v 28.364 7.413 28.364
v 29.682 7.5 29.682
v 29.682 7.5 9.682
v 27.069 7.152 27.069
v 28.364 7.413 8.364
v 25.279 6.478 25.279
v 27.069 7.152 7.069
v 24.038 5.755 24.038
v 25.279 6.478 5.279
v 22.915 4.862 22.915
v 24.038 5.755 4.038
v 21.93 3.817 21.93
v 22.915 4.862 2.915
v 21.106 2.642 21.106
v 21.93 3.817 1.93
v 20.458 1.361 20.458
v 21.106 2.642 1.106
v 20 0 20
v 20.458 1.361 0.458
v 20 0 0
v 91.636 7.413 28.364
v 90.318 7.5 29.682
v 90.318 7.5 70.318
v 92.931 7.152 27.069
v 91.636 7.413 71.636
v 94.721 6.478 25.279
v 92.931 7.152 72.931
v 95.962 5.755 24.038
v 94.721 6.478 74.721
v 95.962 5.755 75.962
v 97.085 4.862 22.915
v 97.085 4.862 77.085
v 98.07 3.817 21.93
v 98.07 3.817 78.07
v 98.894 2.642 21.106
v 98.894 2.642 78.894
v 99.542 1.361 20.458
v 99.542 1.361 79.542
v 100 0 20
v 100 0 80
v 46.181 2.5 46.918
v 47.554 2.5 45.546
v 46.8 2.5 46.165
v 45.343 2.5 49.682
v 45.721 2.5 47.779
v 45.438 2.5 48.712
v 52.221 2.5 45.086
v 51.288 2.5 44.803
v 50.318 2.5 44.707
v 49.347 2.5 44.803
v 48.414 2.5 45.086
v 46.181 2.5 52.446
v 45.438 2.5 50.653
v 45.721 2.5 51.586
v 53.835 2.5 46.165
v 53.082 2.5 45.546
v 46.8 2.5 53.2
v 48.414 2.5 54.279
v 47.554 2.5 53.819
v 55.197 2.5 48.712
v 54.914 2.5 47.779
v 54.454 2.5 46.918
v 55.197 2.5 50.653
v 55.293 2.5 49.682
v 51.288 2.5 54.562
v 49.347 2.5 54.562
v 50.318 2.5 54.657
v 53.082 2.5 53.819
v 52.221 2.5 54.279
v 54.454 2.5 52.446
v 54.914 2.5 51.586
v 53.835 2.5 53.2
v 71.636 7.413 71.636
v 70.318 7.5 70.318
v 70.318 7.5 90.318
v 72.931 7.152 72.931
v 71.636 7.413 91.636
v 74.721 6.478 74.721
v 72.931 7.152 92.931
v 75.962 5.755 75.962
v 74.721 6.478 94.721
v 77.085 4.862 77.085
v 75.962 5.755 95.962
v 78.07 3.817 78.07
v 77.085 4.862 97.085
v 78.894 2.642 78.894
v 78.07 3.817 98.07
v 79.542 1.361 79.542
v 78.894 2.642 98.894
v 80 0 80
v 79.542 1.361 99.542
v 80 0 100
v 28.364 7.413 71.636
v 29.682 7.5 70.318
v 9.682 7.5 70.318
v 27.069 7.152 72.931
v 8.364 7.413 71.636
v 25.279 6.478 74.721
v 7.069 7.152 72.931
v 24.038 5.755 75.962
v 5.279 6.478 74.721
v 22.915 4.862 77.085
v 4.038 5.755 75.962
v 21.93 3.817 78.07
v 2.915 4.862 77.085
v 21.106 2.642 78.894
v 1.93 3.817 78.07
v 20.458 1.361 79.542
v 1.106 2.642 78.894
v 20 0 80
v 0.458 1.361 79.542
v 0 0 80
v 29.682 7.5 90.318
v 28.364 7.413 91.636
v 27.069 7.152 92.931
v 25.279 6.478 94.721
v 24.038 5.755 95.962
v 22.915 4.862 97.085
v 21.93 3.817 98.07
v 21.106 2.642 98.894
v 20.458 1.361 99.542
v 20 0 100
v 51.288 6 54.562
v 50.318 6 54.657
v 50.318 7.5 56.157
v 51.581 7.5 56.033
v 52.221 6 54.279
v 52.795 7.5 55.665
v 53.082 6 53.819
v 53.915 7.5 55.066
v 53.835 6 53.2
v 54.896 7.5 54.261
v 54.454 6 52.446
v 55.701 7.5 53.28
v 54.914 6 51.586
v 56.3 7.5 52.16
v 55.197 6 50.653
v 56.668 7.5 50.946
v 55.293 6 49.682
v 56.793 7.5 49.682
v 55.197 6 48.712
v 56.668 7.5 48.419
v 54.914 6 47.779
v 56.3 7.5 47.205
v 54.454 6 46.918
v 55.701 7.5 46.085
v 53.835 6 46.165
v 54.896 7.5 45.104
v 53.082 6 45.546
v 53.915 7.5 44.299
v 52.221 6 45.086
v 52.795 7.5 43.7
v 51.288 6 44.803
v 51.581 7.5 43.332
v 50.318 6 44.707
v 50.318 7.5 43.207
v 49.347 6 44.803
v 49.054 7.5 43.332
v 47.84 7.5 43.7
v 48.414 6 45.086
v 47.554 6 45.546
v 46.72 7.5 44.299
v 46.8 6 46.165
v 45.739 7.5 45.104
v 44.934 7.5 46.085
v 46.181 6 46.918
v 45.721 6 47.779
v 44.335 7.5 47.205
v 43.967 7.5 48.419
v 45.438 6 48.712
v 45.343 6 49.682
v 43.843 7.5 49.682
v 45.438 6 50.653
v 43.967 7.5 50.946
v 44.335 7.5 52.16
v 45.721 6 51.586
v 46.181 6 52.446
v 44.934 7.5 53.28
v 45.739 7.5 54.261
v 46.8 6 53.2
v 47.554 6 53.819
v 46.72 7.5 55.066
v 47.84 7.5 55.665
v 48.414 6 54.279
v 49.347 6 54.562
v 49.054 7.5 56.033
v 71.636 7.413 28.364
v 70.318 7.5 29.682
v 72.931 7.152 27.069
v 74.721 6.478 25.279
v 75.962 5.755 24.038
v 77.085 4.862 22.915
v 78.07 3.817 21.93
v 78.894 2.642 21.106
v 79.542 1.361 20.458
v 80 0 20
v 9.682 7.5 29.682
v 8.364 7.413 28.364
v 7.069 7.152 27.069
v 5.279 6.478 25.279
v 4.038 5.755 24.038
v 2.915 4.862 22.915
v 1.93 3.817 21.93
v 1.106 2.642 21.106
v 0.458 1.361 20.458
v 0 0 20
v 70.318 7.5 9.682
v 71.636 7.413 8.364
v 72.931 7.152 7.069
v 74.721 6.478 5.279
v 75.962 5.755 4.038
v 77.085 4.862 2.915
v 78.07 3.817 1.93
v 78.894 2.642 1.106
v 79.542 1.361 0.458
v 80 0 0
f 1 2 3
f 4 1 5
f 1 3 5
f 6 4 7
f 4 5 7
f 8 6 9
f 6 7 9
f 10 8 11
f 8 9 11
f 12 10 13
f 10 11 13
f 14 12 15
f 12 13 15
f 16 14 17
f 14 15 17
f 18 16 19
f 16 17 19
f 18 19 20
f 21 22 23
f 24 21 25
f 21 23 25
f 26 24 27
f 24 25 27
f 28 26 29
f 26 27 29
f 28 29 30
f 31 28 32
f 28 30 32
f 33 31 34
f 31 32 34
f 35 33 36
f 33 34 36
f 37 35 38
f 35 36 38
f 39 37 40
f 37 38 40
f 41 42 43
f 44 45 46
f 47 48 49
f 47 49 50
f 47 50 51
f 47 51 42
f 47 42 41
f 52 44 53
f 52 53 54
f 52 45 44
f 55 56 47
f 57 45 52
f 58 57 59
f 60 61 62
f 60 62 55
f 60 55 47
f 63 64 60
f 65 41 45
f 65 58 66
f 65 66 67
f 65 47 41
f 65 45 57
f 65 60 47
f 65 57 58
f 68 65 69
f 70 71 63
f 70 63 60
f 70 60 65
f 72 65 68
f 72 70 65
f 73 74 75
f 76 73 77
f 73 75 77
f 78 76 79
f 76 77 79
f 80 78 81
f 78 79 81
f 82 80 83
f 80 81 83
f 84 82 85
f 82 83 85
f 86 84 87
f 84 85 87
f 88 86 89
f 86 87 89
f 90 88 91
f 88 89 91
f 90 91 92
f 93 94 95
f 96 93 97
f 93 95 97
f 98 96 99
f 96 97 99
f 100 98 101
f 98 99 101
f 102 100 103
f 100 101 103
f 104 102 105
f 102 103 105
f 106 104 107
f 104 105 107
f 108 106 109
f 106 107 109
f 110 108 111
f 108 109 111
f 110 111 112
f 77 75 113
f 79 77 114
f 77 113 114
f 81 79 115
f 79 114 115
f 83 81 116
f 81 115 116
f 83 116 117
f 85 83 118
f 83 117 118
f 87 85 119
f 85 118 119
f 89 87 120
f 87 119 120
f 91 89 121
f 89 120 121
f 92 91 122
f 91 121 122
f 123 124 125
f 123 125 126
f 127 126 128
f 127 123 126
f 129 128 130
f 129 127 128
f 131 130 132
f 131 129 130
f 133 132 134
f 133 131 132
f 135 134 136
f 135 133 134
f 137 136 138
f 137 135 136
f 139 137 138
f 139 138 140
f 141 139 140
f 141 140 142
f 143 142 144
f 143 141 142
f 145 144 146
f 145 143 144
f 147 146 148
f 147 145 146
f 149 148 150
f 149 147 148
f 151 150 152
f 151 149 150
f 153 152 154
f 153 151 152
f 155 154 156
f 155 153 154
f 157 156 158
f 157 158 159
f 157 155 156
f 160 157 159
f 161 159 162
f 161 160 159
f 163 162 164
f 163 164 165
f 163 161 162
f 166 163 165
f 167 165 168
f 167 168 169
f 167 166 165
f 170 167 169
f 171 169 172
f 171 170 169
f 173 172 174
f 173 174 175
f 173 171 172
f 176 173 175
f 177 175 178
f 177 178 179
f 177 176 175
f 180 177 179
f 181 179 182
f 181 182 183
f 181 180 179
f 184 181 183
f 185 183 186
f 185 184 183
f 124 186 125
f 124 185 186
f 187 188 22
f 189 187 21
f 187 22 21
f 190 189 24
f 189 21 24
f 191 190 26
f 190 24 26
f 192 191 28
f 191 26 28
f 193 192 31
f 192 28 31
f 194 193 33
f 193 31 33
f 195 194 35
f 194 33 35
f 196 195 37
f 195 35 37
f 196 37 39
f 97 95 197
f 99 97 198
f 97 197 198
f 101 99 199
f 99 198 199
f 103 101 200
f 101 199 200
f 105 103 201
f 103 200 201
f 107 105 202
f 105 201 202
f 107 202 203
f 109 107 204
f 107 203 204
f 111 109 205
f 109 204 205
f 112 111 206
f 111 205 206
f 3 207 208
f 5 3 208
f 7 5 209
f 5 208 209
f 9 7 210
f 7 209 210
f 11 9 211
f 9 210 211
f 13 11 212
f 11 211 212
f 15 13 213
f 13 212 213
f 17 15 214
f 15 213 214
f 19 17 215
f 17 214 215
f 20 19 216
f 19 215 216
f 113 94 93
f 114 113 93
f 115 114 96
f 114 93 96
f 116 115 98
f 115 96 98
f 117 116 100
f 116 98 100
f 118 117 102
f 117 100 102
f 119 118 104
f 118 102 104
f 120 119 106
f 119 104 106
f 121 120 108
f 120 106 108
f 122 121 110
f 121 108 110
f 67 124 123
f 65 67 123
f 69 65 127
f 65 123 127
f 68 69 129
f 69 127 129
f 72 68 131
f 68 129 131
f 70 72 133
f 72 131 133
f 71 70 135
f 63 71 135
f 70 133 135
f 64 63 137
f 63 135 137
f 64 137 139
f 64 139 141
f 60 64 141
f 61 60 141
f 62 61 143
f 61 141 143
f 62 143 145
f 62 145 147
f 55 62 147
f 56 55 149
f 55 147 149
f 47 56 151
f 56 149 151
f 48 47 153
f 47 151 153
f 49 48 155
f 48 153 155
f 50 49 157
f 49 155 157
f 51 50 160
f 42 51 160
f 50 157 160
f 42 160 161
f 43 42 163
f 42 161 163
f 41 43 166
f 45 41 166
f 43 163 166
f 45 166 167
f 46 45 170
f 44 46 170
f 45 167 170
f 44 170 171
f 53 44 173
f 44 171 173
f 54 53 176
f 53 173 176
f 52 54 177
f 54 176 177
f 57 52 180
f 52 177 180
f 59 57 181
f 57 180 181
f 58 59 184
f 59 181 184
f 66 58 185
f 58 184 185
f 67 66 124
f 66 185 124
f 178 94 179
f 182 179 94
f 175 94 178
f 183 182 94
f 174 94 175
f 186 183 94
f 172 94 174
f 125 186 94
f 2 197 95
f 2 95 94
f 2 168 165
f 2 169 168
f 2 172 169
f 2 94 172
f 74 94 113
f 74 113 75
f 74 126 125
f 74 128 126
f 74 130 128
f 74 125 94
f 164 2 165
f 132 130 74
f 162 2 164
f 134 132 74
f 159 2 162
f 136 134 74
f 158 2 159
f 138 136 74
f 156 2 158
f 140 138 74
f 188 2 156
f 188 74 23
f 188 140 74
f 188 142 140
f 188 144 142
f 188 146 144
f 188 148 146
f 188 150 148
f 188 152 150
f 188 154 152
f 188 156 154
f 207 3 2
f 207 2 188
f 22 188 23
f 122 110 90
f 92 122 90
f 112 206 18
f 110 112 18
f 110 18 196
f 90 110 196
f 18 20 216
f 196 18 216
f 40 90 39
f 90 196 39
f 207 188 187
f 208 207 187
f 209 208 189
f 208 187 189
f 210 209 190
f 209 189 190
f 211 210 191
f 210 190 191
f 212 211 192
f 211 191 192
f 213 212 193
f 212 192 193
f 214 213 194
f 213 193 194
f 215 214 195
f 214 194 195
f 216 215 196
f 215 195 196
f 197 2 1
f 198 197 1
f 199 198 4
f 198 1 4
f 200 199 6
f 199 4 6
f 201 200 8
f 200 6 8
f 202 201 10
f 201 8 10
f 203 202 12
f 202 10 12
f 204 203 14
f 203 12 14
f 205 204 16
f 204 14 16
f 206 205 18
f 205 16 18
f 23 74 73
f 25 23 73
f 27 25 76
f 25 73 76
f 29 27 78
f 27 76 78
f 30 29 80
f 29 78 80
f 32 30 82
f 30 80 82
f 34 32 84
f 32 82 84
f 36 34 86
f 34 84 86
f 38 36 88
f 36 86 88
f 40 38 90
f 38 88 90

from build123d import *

# Parameters (mm, degrees)
BOSS_EXTRUDE1_DEPTH = 7.5
FILLET1_R           = 10
SKETCH2_R           = 4.975
CUT_EXTRUDE1_DEPTH  = 5
CHAMFER2_SIZE       = 1.5


with BuildPart() as part:
    # Sketch1 → Boss-Extrude1 (new body)
    with BuildSketch(Plane(origin=(0, 0, 0), x_dir=(1, 0, 0), z_dir=(0, 1, 0))):
        Polygon((80, 0), (20, 0), (20, -20), (0, -20), (0, -80), (20, -80), (20, -100), (80, -100), (80, -80), (100, -80), (100, -20), (80, -20), align=None)
    extrude(amount=BOSS_EXTRUDE1_DEPTH)

    # Fillet1
    # the kernel refuses this fillet: 10 mm, written as the material it takes off along each edge
    with BuildSketch(Plane(origin=(-24.206145914, 7.5, 80), x_dir=(0, -1, 0), z_dir=(1, 0, 0)), Plane(origin=(20, 7.5, 80), x_dir=(0, -1, 0), z_dir=(0, 0, 1)), Plane(origin=(80, 7.5, 124.206145914), x_dir=(0, -1, 0), z_dir=(0, 0, -1)), Plane(origin=(80, 7.5, 80), x_dir=(0, -1, 0), z_dir=(1, 0, 0)), Plane(origin=(124.206145914, 7.5, 20), x_dir=(0, -1, 0), z_dir=(-1, 0, 0)), Plane(origin=(80, 7.5, 20), x_dir=(0, -1, 0), z_dir=(0, 0, -1)), Plane(origin=(20, 7.5, -24.206145914), x_dir=(0, -1, 0), z_dir=(0, 0, 1)), Plane(origin=(20, 7.5, 20), x_dir=(0, -1, 0), z_dir=(-1, 0, 0))) as fillet1_piece_1:
        with BuildLine():
            CenterArc((10, 9.682458366), FILLET1_R, 180, 75.522487814)
            Line((0, 9.682458366), (-0.2, 9.682458366))
            Line((-0.2, 9.682458366), (-0.2, 0))
            Line((-0.2, 0), (0, -0.2))
            ThreePointArc((0, -0.2), (3.75, -0.2), (7.45, -0.193649167))
            Line((7.45, -0.193649167), (7.5, 0))
        make_face()
    extrude(amount=44.206145914, mode=Mode.SUBTRACT)
    with BuildSketch(Plane(origin=(-4.206145914, 7.5, 100), x_dir=(0, -1, 0), z_dir=(1, 0, 0)), Plane(origin=(100, 7.5, 104.206145914), x_dir=(0, -1, 0), z_dir=(0, 0, -1)), Plane(origin=(104.206145914, 7.5, 0), x_dir=(0, -1, 0), z_dir=(-1, 0, 0)), Plane(origin=(0, 7.5, -4.206145914), x_dir=(0, -1, 0), z_dir=(0, 0, 1))) as fillet1_piece_2:
        with BuildLine():
            CenterArc((10, 9.682458366), FILLET1_R, 180, 75.522487814)
            Line((0, 9.682458366), (-0.2, 9.682458366))
            Line((-0.2, 9.682458366), (-0.2, 0))
            Line((-0.2, 0), (0, -0.2))
            ThreePointArc((0, -0.2), (3.75, -0.2), (7.45, -0.193649167))
            Line((7.45, -0.193649167), (7.5, 0))
        make_face()
    extrude(amount=108.412291828, mode=Mode.SUBTRACT)
    with BuildSketch(Plane(origin=(-24.206145914, 7.5, 80), x_dir=(0, -1, 0), z_dir=(1, 0, 0))) as fillet1_piece_3a_section:
        with BuildLine():
            CenterArc((10, 9.682458366), FILLET1_R, 180, 75.522487814)
            Line((0, 9.682458366), (-0.2, 9.682458366))
            Line((-0.2, 9.682458366), (-0.2, 0))
            Line((-0.2, 0), (0, -0.2))
            ThreePointArc((0, -0.2), (3.75, -0.2), (7.45, -0.193649167))
            Line((7.45, -0.193649167), (7.5, 0))
        make_face()
    fillet1_piece_3a = extrude(amount=68.412291828, mode=Mode.PRIVATE)
    fillet1_piece_3a = split(fillet1_piece_3a, bisect_by=Plane(origin=(20, 5.604082443, 77.718558992), z_dir=(1, 0, 0)), keep=Keep.TOP, mode=Mode.PRIVATE)
    with BuildSketch(Plane(origin=(20, 7.5, 55.793854086), x_dir=(0, -1, 0), z_dir=(0, 0, 1))) as fillet1_piece_3b_section:
        with BuildLine():
            CenterArc((10, 9.682458366), FILLET1_R, 180, 75.522487814)
            Line((0, 9.682458366), (-0.2, 9.682458366))
            Line((-0.2, 9.682458366), (-0.2, 0))
            Line((-0.2, 0), (0, -0.2))
            ThreePointArc((0, -0.2), (3.75, -0.2), (7.45, -0.193649167))
            Line((7.45, -0.193649167), (7.5, 0))
        make_face()
    fillet1_piece_3b = extrude(amount=68.412291828, mode=Mode.PRIVATE)
    fillet1_piece_3b = split(fillet1_piece_3b, bisect_by=Plane(origin=(22.281441008, 5.604082443, 80), z_dir=(0, 0, -1)), keep=Keep.TOP, mode=Mode.PRIVATE)
    fillet1_piece_3 = fillet1_piece_3a & fillet1_piece_3b
    add(fillet1_piece_3, mode=Mode.SUBTRACT)
    with BuildSketch(Plane(origin=(80, 7.5, 124.206145914), x_dir=(0, -1, 0), z_dir=(0, 0, -1))) as fillet1_piece_4a_section:
        with BuildLine():
            CenterArc((10, 9.682458366), FILLET1_R, 180, 75.522487814)
            Line((0, 9.682458366), (-0.2, 9.682458366))
            Line((-0.2, 9.682458366), (-0.2, 0))
            Line((-0.2, 0), (0, -0.2))
            ThreePointArc((0, -0.2), (3.75, -0.2), (7.45, -0.193649167))
            Line((7.45, -0.193649167), (7.5, 0))
        make_face()
    fillet1_piece_4a = extrude(amount=68.412291828, mode=Mode.PRIVATE)
    fillet1_piece_4a = split(fillet1_piece_4a, bisect_by=Plane(origin=(77.718558992, 5.604082443, 80), z_dir=(0, 0, -1)), keep=Keep.TOP, mode=Mode.PRIVATE)
    with BuildSketch(Plane(origin=(55.793854086, 7.5, 80), x_dir=(0, -1, 0), z_dir=(1, 0, 0))) as fillet1_piece_4b_section:
        with BuildLine():
            CenterArc((10, 9.682458366), FILLET1_R, 180, 75.522487814)
            Line((0, 9.682458366), (-0.2, 9.682458366))
            Line((-0.2, 9.682458366), (-0.2, 0))
            Line((-0.2, 0), (0, -0.2))
            ThreePointArc((0, -0.2), (3.75, -0.2), (7.45, -0.193649167))
            Line((7.45, -0.193649167), (7.5, 0))
        make_face()
    fillet1_piece_4b = extrude(amount=68.412291828, mode=Mode.PRIVATE)
    fillet1_piece_4b = split(fillet1_piece_4b, bisect_by=Plane(origin=(80, 5.604082443, 77.718558992), z_dir=(-1, 0, 0)), keep=Keep.TOP, mode=Mode.PRIVATE)
    fillet1_piece_4 = fillet1_piece_4a & fillet1_piece_4b
    add(fillet1_piece_4, mode=Mode.SUBTRACT)
    with BuildSketch(Plane(origin=(124.206145914, 7.5, 20), x_dir=(0, -1, 0), z_dir=(-1, 0, 0))) as fillet1_piece_5a_section:
        with BuildLine():
            CenterArc((10, 9.682458366), FILLET1_R, 180, 75.522487814)
            Line((0, 9.682458366), (-0.2, 9.682458366))
            Line((-0.2, 9.682458366), (-0.2, 0))
            Line((-0.2, 0), (0, -0.2))
            ThreePointArc((0, -0.2), (3.75, -0.2), (7.45, -0.193649167))
            Line((7.45, -0.193649167), (7.5, 0))
        make_face()
    fillet1_piece_5a = extrude(amount=68.412291828, mode=Mode.PRIVATE)
    fillet1_piece_5a = split(fillet1_piece_5a, bisect_by=Plane(origin=(80, 5.604082443, 22.281441008), z_dir=(-1, 0, 0)), keep=Keep.TOP, mode=Mode.PRIVATE)
    with BuildSketch(Plane(origin=(80, 7.5, 44.206145914), x_dir=(0, -1, 0), z_dir=(0, 0, -1))) as fillet1_piece_5b_section:
        with BuildLine():
            CenterArc((10, 9.682458366), FILLET1_R, 180, 75.522487814)
            Line((0, 9.682458366), (-0.2, 9.682458366))
            Line((-0.2, 9.682458366), (-0.2, 0))
            Line((-0.2, 0), (0, -0.2))
            ThreePointArc((0, -0.2), (3.75, -0.2), (7.45, -0.193649167))
            Line((7.45, -0.193649167), (7.5, 0))
        make_face()
    fillet1_piece_5b = extrude(amount=68.412291828, mode=Mode.PRIVATE)
    fillet1_piece_5b = split(fillet1_piece_5b, bisect_by=Plane(origin=(77.718558992, 5.604082443, 20), z_dir=(0, 0, 1)), keep=Keep.TOP, mode=Mode.PRIVATE)
    fillet1_piece_5 = fillet1_piece_5a & fillet1_piece_5b
    add(fillet1_piece_5, mode=Mode.SUBTRACT)
    with BuildSketch(Plane(origin=(20, 7.5, -24.206145914), x_dir=(0, -1, 0), z_dir=(0, 0, 1))) as fillet1_piece_6a_section:
        with BuildLine():
            CenterArc((10, 9.682458366), FILLET1_R, 180, 75.522487814)
            Line((0, 9.682458366), (-0.2, 9.682458366))
            Line((-0.2, 9.682458366), (-0.2, 0))
            Line((-0.2, 0), (0, -0.2))
            ThreePointArc((0, -0.2), (3.75, -0.2), (7.45, -0.193649167))
            Line((7.45, -0.193649167), (7.5, 0))
        make_face()
    fillet1_piece_6a = extrude(amount=68.412291828, mode=Mode.PRIVATE)
    fillet1_piece_6a = split(fillet1_piece_6a, bisect_by=Plane(origin=(22.281441008, 5.604082443, 20), z_dir=(0, 0, 1)), keep=Keep.TOP, mode=Mode.PRIVATE)
    with BuildSketch(Plane(origin=(44.206145914, 7.5, 20), x_dir=(0, -1, 0), z_dir=(-1, 0, 0))) as fillet1_piece_6b_section:
        with BuildLine():
            CenterArc((10, 9.682458366), FILLET1_R, 180, 75.522487814)
            Line((0, 9.682458366), (-0.2, 9.682458366))
            Line((-0.2, 9.682458366), (-0.2, 0))
            Line((-0.2, 0), (0, -0.2))
            ThreePointArc((0, -0.2), (3.75, -0.2), (7.45, -0.193649167))
            Line((7.45, -0.193649167), (7.5, 0))
        make_face()
    fillet1_piece_6b = extrude(amount=68.412291828, mode=Mode.PRIVATE)
    fillet1_piece_6b = split(fillet1_piece_6b, bisect_by=Plane(origin=(20, 5.604082443, 22.281441008), z_dir=(1, 0, 0)), keep=Keep.TOP, mode=Mode.PRIVATE)
    fillet1_piece_6 = fillet1_piece_6a & fillet1_piece_6b
    add(fillet1_piece_6, mode=Mode.SUBTRACT)

    # Sketch2 → Cut-Extrude1 (cut)
    with BuildSketch(Plane(origin=(0, 7.5, 0), x_dir=(1, 0, 0), z_dir=(0, 1, 0))):
        with Locations(Location((50.317541634, -49.682458366, 0), (0, 0, 270))):
            Circle(SKETCH2_R)
    extrude(amount=-CUT_EXTRUDE1_DEPTH, mode=Mode.SUBTRACT)

    # Chamfer2
    chamfer2_edges = [part.edges().sort_by_distance(p)[0] for p in [
        (50.317541634, 7.5, 44.707458366),
    ]]
    chamfer(chamfer2_edges, length=CHAMFER2_SIZE)


solid = part.part
